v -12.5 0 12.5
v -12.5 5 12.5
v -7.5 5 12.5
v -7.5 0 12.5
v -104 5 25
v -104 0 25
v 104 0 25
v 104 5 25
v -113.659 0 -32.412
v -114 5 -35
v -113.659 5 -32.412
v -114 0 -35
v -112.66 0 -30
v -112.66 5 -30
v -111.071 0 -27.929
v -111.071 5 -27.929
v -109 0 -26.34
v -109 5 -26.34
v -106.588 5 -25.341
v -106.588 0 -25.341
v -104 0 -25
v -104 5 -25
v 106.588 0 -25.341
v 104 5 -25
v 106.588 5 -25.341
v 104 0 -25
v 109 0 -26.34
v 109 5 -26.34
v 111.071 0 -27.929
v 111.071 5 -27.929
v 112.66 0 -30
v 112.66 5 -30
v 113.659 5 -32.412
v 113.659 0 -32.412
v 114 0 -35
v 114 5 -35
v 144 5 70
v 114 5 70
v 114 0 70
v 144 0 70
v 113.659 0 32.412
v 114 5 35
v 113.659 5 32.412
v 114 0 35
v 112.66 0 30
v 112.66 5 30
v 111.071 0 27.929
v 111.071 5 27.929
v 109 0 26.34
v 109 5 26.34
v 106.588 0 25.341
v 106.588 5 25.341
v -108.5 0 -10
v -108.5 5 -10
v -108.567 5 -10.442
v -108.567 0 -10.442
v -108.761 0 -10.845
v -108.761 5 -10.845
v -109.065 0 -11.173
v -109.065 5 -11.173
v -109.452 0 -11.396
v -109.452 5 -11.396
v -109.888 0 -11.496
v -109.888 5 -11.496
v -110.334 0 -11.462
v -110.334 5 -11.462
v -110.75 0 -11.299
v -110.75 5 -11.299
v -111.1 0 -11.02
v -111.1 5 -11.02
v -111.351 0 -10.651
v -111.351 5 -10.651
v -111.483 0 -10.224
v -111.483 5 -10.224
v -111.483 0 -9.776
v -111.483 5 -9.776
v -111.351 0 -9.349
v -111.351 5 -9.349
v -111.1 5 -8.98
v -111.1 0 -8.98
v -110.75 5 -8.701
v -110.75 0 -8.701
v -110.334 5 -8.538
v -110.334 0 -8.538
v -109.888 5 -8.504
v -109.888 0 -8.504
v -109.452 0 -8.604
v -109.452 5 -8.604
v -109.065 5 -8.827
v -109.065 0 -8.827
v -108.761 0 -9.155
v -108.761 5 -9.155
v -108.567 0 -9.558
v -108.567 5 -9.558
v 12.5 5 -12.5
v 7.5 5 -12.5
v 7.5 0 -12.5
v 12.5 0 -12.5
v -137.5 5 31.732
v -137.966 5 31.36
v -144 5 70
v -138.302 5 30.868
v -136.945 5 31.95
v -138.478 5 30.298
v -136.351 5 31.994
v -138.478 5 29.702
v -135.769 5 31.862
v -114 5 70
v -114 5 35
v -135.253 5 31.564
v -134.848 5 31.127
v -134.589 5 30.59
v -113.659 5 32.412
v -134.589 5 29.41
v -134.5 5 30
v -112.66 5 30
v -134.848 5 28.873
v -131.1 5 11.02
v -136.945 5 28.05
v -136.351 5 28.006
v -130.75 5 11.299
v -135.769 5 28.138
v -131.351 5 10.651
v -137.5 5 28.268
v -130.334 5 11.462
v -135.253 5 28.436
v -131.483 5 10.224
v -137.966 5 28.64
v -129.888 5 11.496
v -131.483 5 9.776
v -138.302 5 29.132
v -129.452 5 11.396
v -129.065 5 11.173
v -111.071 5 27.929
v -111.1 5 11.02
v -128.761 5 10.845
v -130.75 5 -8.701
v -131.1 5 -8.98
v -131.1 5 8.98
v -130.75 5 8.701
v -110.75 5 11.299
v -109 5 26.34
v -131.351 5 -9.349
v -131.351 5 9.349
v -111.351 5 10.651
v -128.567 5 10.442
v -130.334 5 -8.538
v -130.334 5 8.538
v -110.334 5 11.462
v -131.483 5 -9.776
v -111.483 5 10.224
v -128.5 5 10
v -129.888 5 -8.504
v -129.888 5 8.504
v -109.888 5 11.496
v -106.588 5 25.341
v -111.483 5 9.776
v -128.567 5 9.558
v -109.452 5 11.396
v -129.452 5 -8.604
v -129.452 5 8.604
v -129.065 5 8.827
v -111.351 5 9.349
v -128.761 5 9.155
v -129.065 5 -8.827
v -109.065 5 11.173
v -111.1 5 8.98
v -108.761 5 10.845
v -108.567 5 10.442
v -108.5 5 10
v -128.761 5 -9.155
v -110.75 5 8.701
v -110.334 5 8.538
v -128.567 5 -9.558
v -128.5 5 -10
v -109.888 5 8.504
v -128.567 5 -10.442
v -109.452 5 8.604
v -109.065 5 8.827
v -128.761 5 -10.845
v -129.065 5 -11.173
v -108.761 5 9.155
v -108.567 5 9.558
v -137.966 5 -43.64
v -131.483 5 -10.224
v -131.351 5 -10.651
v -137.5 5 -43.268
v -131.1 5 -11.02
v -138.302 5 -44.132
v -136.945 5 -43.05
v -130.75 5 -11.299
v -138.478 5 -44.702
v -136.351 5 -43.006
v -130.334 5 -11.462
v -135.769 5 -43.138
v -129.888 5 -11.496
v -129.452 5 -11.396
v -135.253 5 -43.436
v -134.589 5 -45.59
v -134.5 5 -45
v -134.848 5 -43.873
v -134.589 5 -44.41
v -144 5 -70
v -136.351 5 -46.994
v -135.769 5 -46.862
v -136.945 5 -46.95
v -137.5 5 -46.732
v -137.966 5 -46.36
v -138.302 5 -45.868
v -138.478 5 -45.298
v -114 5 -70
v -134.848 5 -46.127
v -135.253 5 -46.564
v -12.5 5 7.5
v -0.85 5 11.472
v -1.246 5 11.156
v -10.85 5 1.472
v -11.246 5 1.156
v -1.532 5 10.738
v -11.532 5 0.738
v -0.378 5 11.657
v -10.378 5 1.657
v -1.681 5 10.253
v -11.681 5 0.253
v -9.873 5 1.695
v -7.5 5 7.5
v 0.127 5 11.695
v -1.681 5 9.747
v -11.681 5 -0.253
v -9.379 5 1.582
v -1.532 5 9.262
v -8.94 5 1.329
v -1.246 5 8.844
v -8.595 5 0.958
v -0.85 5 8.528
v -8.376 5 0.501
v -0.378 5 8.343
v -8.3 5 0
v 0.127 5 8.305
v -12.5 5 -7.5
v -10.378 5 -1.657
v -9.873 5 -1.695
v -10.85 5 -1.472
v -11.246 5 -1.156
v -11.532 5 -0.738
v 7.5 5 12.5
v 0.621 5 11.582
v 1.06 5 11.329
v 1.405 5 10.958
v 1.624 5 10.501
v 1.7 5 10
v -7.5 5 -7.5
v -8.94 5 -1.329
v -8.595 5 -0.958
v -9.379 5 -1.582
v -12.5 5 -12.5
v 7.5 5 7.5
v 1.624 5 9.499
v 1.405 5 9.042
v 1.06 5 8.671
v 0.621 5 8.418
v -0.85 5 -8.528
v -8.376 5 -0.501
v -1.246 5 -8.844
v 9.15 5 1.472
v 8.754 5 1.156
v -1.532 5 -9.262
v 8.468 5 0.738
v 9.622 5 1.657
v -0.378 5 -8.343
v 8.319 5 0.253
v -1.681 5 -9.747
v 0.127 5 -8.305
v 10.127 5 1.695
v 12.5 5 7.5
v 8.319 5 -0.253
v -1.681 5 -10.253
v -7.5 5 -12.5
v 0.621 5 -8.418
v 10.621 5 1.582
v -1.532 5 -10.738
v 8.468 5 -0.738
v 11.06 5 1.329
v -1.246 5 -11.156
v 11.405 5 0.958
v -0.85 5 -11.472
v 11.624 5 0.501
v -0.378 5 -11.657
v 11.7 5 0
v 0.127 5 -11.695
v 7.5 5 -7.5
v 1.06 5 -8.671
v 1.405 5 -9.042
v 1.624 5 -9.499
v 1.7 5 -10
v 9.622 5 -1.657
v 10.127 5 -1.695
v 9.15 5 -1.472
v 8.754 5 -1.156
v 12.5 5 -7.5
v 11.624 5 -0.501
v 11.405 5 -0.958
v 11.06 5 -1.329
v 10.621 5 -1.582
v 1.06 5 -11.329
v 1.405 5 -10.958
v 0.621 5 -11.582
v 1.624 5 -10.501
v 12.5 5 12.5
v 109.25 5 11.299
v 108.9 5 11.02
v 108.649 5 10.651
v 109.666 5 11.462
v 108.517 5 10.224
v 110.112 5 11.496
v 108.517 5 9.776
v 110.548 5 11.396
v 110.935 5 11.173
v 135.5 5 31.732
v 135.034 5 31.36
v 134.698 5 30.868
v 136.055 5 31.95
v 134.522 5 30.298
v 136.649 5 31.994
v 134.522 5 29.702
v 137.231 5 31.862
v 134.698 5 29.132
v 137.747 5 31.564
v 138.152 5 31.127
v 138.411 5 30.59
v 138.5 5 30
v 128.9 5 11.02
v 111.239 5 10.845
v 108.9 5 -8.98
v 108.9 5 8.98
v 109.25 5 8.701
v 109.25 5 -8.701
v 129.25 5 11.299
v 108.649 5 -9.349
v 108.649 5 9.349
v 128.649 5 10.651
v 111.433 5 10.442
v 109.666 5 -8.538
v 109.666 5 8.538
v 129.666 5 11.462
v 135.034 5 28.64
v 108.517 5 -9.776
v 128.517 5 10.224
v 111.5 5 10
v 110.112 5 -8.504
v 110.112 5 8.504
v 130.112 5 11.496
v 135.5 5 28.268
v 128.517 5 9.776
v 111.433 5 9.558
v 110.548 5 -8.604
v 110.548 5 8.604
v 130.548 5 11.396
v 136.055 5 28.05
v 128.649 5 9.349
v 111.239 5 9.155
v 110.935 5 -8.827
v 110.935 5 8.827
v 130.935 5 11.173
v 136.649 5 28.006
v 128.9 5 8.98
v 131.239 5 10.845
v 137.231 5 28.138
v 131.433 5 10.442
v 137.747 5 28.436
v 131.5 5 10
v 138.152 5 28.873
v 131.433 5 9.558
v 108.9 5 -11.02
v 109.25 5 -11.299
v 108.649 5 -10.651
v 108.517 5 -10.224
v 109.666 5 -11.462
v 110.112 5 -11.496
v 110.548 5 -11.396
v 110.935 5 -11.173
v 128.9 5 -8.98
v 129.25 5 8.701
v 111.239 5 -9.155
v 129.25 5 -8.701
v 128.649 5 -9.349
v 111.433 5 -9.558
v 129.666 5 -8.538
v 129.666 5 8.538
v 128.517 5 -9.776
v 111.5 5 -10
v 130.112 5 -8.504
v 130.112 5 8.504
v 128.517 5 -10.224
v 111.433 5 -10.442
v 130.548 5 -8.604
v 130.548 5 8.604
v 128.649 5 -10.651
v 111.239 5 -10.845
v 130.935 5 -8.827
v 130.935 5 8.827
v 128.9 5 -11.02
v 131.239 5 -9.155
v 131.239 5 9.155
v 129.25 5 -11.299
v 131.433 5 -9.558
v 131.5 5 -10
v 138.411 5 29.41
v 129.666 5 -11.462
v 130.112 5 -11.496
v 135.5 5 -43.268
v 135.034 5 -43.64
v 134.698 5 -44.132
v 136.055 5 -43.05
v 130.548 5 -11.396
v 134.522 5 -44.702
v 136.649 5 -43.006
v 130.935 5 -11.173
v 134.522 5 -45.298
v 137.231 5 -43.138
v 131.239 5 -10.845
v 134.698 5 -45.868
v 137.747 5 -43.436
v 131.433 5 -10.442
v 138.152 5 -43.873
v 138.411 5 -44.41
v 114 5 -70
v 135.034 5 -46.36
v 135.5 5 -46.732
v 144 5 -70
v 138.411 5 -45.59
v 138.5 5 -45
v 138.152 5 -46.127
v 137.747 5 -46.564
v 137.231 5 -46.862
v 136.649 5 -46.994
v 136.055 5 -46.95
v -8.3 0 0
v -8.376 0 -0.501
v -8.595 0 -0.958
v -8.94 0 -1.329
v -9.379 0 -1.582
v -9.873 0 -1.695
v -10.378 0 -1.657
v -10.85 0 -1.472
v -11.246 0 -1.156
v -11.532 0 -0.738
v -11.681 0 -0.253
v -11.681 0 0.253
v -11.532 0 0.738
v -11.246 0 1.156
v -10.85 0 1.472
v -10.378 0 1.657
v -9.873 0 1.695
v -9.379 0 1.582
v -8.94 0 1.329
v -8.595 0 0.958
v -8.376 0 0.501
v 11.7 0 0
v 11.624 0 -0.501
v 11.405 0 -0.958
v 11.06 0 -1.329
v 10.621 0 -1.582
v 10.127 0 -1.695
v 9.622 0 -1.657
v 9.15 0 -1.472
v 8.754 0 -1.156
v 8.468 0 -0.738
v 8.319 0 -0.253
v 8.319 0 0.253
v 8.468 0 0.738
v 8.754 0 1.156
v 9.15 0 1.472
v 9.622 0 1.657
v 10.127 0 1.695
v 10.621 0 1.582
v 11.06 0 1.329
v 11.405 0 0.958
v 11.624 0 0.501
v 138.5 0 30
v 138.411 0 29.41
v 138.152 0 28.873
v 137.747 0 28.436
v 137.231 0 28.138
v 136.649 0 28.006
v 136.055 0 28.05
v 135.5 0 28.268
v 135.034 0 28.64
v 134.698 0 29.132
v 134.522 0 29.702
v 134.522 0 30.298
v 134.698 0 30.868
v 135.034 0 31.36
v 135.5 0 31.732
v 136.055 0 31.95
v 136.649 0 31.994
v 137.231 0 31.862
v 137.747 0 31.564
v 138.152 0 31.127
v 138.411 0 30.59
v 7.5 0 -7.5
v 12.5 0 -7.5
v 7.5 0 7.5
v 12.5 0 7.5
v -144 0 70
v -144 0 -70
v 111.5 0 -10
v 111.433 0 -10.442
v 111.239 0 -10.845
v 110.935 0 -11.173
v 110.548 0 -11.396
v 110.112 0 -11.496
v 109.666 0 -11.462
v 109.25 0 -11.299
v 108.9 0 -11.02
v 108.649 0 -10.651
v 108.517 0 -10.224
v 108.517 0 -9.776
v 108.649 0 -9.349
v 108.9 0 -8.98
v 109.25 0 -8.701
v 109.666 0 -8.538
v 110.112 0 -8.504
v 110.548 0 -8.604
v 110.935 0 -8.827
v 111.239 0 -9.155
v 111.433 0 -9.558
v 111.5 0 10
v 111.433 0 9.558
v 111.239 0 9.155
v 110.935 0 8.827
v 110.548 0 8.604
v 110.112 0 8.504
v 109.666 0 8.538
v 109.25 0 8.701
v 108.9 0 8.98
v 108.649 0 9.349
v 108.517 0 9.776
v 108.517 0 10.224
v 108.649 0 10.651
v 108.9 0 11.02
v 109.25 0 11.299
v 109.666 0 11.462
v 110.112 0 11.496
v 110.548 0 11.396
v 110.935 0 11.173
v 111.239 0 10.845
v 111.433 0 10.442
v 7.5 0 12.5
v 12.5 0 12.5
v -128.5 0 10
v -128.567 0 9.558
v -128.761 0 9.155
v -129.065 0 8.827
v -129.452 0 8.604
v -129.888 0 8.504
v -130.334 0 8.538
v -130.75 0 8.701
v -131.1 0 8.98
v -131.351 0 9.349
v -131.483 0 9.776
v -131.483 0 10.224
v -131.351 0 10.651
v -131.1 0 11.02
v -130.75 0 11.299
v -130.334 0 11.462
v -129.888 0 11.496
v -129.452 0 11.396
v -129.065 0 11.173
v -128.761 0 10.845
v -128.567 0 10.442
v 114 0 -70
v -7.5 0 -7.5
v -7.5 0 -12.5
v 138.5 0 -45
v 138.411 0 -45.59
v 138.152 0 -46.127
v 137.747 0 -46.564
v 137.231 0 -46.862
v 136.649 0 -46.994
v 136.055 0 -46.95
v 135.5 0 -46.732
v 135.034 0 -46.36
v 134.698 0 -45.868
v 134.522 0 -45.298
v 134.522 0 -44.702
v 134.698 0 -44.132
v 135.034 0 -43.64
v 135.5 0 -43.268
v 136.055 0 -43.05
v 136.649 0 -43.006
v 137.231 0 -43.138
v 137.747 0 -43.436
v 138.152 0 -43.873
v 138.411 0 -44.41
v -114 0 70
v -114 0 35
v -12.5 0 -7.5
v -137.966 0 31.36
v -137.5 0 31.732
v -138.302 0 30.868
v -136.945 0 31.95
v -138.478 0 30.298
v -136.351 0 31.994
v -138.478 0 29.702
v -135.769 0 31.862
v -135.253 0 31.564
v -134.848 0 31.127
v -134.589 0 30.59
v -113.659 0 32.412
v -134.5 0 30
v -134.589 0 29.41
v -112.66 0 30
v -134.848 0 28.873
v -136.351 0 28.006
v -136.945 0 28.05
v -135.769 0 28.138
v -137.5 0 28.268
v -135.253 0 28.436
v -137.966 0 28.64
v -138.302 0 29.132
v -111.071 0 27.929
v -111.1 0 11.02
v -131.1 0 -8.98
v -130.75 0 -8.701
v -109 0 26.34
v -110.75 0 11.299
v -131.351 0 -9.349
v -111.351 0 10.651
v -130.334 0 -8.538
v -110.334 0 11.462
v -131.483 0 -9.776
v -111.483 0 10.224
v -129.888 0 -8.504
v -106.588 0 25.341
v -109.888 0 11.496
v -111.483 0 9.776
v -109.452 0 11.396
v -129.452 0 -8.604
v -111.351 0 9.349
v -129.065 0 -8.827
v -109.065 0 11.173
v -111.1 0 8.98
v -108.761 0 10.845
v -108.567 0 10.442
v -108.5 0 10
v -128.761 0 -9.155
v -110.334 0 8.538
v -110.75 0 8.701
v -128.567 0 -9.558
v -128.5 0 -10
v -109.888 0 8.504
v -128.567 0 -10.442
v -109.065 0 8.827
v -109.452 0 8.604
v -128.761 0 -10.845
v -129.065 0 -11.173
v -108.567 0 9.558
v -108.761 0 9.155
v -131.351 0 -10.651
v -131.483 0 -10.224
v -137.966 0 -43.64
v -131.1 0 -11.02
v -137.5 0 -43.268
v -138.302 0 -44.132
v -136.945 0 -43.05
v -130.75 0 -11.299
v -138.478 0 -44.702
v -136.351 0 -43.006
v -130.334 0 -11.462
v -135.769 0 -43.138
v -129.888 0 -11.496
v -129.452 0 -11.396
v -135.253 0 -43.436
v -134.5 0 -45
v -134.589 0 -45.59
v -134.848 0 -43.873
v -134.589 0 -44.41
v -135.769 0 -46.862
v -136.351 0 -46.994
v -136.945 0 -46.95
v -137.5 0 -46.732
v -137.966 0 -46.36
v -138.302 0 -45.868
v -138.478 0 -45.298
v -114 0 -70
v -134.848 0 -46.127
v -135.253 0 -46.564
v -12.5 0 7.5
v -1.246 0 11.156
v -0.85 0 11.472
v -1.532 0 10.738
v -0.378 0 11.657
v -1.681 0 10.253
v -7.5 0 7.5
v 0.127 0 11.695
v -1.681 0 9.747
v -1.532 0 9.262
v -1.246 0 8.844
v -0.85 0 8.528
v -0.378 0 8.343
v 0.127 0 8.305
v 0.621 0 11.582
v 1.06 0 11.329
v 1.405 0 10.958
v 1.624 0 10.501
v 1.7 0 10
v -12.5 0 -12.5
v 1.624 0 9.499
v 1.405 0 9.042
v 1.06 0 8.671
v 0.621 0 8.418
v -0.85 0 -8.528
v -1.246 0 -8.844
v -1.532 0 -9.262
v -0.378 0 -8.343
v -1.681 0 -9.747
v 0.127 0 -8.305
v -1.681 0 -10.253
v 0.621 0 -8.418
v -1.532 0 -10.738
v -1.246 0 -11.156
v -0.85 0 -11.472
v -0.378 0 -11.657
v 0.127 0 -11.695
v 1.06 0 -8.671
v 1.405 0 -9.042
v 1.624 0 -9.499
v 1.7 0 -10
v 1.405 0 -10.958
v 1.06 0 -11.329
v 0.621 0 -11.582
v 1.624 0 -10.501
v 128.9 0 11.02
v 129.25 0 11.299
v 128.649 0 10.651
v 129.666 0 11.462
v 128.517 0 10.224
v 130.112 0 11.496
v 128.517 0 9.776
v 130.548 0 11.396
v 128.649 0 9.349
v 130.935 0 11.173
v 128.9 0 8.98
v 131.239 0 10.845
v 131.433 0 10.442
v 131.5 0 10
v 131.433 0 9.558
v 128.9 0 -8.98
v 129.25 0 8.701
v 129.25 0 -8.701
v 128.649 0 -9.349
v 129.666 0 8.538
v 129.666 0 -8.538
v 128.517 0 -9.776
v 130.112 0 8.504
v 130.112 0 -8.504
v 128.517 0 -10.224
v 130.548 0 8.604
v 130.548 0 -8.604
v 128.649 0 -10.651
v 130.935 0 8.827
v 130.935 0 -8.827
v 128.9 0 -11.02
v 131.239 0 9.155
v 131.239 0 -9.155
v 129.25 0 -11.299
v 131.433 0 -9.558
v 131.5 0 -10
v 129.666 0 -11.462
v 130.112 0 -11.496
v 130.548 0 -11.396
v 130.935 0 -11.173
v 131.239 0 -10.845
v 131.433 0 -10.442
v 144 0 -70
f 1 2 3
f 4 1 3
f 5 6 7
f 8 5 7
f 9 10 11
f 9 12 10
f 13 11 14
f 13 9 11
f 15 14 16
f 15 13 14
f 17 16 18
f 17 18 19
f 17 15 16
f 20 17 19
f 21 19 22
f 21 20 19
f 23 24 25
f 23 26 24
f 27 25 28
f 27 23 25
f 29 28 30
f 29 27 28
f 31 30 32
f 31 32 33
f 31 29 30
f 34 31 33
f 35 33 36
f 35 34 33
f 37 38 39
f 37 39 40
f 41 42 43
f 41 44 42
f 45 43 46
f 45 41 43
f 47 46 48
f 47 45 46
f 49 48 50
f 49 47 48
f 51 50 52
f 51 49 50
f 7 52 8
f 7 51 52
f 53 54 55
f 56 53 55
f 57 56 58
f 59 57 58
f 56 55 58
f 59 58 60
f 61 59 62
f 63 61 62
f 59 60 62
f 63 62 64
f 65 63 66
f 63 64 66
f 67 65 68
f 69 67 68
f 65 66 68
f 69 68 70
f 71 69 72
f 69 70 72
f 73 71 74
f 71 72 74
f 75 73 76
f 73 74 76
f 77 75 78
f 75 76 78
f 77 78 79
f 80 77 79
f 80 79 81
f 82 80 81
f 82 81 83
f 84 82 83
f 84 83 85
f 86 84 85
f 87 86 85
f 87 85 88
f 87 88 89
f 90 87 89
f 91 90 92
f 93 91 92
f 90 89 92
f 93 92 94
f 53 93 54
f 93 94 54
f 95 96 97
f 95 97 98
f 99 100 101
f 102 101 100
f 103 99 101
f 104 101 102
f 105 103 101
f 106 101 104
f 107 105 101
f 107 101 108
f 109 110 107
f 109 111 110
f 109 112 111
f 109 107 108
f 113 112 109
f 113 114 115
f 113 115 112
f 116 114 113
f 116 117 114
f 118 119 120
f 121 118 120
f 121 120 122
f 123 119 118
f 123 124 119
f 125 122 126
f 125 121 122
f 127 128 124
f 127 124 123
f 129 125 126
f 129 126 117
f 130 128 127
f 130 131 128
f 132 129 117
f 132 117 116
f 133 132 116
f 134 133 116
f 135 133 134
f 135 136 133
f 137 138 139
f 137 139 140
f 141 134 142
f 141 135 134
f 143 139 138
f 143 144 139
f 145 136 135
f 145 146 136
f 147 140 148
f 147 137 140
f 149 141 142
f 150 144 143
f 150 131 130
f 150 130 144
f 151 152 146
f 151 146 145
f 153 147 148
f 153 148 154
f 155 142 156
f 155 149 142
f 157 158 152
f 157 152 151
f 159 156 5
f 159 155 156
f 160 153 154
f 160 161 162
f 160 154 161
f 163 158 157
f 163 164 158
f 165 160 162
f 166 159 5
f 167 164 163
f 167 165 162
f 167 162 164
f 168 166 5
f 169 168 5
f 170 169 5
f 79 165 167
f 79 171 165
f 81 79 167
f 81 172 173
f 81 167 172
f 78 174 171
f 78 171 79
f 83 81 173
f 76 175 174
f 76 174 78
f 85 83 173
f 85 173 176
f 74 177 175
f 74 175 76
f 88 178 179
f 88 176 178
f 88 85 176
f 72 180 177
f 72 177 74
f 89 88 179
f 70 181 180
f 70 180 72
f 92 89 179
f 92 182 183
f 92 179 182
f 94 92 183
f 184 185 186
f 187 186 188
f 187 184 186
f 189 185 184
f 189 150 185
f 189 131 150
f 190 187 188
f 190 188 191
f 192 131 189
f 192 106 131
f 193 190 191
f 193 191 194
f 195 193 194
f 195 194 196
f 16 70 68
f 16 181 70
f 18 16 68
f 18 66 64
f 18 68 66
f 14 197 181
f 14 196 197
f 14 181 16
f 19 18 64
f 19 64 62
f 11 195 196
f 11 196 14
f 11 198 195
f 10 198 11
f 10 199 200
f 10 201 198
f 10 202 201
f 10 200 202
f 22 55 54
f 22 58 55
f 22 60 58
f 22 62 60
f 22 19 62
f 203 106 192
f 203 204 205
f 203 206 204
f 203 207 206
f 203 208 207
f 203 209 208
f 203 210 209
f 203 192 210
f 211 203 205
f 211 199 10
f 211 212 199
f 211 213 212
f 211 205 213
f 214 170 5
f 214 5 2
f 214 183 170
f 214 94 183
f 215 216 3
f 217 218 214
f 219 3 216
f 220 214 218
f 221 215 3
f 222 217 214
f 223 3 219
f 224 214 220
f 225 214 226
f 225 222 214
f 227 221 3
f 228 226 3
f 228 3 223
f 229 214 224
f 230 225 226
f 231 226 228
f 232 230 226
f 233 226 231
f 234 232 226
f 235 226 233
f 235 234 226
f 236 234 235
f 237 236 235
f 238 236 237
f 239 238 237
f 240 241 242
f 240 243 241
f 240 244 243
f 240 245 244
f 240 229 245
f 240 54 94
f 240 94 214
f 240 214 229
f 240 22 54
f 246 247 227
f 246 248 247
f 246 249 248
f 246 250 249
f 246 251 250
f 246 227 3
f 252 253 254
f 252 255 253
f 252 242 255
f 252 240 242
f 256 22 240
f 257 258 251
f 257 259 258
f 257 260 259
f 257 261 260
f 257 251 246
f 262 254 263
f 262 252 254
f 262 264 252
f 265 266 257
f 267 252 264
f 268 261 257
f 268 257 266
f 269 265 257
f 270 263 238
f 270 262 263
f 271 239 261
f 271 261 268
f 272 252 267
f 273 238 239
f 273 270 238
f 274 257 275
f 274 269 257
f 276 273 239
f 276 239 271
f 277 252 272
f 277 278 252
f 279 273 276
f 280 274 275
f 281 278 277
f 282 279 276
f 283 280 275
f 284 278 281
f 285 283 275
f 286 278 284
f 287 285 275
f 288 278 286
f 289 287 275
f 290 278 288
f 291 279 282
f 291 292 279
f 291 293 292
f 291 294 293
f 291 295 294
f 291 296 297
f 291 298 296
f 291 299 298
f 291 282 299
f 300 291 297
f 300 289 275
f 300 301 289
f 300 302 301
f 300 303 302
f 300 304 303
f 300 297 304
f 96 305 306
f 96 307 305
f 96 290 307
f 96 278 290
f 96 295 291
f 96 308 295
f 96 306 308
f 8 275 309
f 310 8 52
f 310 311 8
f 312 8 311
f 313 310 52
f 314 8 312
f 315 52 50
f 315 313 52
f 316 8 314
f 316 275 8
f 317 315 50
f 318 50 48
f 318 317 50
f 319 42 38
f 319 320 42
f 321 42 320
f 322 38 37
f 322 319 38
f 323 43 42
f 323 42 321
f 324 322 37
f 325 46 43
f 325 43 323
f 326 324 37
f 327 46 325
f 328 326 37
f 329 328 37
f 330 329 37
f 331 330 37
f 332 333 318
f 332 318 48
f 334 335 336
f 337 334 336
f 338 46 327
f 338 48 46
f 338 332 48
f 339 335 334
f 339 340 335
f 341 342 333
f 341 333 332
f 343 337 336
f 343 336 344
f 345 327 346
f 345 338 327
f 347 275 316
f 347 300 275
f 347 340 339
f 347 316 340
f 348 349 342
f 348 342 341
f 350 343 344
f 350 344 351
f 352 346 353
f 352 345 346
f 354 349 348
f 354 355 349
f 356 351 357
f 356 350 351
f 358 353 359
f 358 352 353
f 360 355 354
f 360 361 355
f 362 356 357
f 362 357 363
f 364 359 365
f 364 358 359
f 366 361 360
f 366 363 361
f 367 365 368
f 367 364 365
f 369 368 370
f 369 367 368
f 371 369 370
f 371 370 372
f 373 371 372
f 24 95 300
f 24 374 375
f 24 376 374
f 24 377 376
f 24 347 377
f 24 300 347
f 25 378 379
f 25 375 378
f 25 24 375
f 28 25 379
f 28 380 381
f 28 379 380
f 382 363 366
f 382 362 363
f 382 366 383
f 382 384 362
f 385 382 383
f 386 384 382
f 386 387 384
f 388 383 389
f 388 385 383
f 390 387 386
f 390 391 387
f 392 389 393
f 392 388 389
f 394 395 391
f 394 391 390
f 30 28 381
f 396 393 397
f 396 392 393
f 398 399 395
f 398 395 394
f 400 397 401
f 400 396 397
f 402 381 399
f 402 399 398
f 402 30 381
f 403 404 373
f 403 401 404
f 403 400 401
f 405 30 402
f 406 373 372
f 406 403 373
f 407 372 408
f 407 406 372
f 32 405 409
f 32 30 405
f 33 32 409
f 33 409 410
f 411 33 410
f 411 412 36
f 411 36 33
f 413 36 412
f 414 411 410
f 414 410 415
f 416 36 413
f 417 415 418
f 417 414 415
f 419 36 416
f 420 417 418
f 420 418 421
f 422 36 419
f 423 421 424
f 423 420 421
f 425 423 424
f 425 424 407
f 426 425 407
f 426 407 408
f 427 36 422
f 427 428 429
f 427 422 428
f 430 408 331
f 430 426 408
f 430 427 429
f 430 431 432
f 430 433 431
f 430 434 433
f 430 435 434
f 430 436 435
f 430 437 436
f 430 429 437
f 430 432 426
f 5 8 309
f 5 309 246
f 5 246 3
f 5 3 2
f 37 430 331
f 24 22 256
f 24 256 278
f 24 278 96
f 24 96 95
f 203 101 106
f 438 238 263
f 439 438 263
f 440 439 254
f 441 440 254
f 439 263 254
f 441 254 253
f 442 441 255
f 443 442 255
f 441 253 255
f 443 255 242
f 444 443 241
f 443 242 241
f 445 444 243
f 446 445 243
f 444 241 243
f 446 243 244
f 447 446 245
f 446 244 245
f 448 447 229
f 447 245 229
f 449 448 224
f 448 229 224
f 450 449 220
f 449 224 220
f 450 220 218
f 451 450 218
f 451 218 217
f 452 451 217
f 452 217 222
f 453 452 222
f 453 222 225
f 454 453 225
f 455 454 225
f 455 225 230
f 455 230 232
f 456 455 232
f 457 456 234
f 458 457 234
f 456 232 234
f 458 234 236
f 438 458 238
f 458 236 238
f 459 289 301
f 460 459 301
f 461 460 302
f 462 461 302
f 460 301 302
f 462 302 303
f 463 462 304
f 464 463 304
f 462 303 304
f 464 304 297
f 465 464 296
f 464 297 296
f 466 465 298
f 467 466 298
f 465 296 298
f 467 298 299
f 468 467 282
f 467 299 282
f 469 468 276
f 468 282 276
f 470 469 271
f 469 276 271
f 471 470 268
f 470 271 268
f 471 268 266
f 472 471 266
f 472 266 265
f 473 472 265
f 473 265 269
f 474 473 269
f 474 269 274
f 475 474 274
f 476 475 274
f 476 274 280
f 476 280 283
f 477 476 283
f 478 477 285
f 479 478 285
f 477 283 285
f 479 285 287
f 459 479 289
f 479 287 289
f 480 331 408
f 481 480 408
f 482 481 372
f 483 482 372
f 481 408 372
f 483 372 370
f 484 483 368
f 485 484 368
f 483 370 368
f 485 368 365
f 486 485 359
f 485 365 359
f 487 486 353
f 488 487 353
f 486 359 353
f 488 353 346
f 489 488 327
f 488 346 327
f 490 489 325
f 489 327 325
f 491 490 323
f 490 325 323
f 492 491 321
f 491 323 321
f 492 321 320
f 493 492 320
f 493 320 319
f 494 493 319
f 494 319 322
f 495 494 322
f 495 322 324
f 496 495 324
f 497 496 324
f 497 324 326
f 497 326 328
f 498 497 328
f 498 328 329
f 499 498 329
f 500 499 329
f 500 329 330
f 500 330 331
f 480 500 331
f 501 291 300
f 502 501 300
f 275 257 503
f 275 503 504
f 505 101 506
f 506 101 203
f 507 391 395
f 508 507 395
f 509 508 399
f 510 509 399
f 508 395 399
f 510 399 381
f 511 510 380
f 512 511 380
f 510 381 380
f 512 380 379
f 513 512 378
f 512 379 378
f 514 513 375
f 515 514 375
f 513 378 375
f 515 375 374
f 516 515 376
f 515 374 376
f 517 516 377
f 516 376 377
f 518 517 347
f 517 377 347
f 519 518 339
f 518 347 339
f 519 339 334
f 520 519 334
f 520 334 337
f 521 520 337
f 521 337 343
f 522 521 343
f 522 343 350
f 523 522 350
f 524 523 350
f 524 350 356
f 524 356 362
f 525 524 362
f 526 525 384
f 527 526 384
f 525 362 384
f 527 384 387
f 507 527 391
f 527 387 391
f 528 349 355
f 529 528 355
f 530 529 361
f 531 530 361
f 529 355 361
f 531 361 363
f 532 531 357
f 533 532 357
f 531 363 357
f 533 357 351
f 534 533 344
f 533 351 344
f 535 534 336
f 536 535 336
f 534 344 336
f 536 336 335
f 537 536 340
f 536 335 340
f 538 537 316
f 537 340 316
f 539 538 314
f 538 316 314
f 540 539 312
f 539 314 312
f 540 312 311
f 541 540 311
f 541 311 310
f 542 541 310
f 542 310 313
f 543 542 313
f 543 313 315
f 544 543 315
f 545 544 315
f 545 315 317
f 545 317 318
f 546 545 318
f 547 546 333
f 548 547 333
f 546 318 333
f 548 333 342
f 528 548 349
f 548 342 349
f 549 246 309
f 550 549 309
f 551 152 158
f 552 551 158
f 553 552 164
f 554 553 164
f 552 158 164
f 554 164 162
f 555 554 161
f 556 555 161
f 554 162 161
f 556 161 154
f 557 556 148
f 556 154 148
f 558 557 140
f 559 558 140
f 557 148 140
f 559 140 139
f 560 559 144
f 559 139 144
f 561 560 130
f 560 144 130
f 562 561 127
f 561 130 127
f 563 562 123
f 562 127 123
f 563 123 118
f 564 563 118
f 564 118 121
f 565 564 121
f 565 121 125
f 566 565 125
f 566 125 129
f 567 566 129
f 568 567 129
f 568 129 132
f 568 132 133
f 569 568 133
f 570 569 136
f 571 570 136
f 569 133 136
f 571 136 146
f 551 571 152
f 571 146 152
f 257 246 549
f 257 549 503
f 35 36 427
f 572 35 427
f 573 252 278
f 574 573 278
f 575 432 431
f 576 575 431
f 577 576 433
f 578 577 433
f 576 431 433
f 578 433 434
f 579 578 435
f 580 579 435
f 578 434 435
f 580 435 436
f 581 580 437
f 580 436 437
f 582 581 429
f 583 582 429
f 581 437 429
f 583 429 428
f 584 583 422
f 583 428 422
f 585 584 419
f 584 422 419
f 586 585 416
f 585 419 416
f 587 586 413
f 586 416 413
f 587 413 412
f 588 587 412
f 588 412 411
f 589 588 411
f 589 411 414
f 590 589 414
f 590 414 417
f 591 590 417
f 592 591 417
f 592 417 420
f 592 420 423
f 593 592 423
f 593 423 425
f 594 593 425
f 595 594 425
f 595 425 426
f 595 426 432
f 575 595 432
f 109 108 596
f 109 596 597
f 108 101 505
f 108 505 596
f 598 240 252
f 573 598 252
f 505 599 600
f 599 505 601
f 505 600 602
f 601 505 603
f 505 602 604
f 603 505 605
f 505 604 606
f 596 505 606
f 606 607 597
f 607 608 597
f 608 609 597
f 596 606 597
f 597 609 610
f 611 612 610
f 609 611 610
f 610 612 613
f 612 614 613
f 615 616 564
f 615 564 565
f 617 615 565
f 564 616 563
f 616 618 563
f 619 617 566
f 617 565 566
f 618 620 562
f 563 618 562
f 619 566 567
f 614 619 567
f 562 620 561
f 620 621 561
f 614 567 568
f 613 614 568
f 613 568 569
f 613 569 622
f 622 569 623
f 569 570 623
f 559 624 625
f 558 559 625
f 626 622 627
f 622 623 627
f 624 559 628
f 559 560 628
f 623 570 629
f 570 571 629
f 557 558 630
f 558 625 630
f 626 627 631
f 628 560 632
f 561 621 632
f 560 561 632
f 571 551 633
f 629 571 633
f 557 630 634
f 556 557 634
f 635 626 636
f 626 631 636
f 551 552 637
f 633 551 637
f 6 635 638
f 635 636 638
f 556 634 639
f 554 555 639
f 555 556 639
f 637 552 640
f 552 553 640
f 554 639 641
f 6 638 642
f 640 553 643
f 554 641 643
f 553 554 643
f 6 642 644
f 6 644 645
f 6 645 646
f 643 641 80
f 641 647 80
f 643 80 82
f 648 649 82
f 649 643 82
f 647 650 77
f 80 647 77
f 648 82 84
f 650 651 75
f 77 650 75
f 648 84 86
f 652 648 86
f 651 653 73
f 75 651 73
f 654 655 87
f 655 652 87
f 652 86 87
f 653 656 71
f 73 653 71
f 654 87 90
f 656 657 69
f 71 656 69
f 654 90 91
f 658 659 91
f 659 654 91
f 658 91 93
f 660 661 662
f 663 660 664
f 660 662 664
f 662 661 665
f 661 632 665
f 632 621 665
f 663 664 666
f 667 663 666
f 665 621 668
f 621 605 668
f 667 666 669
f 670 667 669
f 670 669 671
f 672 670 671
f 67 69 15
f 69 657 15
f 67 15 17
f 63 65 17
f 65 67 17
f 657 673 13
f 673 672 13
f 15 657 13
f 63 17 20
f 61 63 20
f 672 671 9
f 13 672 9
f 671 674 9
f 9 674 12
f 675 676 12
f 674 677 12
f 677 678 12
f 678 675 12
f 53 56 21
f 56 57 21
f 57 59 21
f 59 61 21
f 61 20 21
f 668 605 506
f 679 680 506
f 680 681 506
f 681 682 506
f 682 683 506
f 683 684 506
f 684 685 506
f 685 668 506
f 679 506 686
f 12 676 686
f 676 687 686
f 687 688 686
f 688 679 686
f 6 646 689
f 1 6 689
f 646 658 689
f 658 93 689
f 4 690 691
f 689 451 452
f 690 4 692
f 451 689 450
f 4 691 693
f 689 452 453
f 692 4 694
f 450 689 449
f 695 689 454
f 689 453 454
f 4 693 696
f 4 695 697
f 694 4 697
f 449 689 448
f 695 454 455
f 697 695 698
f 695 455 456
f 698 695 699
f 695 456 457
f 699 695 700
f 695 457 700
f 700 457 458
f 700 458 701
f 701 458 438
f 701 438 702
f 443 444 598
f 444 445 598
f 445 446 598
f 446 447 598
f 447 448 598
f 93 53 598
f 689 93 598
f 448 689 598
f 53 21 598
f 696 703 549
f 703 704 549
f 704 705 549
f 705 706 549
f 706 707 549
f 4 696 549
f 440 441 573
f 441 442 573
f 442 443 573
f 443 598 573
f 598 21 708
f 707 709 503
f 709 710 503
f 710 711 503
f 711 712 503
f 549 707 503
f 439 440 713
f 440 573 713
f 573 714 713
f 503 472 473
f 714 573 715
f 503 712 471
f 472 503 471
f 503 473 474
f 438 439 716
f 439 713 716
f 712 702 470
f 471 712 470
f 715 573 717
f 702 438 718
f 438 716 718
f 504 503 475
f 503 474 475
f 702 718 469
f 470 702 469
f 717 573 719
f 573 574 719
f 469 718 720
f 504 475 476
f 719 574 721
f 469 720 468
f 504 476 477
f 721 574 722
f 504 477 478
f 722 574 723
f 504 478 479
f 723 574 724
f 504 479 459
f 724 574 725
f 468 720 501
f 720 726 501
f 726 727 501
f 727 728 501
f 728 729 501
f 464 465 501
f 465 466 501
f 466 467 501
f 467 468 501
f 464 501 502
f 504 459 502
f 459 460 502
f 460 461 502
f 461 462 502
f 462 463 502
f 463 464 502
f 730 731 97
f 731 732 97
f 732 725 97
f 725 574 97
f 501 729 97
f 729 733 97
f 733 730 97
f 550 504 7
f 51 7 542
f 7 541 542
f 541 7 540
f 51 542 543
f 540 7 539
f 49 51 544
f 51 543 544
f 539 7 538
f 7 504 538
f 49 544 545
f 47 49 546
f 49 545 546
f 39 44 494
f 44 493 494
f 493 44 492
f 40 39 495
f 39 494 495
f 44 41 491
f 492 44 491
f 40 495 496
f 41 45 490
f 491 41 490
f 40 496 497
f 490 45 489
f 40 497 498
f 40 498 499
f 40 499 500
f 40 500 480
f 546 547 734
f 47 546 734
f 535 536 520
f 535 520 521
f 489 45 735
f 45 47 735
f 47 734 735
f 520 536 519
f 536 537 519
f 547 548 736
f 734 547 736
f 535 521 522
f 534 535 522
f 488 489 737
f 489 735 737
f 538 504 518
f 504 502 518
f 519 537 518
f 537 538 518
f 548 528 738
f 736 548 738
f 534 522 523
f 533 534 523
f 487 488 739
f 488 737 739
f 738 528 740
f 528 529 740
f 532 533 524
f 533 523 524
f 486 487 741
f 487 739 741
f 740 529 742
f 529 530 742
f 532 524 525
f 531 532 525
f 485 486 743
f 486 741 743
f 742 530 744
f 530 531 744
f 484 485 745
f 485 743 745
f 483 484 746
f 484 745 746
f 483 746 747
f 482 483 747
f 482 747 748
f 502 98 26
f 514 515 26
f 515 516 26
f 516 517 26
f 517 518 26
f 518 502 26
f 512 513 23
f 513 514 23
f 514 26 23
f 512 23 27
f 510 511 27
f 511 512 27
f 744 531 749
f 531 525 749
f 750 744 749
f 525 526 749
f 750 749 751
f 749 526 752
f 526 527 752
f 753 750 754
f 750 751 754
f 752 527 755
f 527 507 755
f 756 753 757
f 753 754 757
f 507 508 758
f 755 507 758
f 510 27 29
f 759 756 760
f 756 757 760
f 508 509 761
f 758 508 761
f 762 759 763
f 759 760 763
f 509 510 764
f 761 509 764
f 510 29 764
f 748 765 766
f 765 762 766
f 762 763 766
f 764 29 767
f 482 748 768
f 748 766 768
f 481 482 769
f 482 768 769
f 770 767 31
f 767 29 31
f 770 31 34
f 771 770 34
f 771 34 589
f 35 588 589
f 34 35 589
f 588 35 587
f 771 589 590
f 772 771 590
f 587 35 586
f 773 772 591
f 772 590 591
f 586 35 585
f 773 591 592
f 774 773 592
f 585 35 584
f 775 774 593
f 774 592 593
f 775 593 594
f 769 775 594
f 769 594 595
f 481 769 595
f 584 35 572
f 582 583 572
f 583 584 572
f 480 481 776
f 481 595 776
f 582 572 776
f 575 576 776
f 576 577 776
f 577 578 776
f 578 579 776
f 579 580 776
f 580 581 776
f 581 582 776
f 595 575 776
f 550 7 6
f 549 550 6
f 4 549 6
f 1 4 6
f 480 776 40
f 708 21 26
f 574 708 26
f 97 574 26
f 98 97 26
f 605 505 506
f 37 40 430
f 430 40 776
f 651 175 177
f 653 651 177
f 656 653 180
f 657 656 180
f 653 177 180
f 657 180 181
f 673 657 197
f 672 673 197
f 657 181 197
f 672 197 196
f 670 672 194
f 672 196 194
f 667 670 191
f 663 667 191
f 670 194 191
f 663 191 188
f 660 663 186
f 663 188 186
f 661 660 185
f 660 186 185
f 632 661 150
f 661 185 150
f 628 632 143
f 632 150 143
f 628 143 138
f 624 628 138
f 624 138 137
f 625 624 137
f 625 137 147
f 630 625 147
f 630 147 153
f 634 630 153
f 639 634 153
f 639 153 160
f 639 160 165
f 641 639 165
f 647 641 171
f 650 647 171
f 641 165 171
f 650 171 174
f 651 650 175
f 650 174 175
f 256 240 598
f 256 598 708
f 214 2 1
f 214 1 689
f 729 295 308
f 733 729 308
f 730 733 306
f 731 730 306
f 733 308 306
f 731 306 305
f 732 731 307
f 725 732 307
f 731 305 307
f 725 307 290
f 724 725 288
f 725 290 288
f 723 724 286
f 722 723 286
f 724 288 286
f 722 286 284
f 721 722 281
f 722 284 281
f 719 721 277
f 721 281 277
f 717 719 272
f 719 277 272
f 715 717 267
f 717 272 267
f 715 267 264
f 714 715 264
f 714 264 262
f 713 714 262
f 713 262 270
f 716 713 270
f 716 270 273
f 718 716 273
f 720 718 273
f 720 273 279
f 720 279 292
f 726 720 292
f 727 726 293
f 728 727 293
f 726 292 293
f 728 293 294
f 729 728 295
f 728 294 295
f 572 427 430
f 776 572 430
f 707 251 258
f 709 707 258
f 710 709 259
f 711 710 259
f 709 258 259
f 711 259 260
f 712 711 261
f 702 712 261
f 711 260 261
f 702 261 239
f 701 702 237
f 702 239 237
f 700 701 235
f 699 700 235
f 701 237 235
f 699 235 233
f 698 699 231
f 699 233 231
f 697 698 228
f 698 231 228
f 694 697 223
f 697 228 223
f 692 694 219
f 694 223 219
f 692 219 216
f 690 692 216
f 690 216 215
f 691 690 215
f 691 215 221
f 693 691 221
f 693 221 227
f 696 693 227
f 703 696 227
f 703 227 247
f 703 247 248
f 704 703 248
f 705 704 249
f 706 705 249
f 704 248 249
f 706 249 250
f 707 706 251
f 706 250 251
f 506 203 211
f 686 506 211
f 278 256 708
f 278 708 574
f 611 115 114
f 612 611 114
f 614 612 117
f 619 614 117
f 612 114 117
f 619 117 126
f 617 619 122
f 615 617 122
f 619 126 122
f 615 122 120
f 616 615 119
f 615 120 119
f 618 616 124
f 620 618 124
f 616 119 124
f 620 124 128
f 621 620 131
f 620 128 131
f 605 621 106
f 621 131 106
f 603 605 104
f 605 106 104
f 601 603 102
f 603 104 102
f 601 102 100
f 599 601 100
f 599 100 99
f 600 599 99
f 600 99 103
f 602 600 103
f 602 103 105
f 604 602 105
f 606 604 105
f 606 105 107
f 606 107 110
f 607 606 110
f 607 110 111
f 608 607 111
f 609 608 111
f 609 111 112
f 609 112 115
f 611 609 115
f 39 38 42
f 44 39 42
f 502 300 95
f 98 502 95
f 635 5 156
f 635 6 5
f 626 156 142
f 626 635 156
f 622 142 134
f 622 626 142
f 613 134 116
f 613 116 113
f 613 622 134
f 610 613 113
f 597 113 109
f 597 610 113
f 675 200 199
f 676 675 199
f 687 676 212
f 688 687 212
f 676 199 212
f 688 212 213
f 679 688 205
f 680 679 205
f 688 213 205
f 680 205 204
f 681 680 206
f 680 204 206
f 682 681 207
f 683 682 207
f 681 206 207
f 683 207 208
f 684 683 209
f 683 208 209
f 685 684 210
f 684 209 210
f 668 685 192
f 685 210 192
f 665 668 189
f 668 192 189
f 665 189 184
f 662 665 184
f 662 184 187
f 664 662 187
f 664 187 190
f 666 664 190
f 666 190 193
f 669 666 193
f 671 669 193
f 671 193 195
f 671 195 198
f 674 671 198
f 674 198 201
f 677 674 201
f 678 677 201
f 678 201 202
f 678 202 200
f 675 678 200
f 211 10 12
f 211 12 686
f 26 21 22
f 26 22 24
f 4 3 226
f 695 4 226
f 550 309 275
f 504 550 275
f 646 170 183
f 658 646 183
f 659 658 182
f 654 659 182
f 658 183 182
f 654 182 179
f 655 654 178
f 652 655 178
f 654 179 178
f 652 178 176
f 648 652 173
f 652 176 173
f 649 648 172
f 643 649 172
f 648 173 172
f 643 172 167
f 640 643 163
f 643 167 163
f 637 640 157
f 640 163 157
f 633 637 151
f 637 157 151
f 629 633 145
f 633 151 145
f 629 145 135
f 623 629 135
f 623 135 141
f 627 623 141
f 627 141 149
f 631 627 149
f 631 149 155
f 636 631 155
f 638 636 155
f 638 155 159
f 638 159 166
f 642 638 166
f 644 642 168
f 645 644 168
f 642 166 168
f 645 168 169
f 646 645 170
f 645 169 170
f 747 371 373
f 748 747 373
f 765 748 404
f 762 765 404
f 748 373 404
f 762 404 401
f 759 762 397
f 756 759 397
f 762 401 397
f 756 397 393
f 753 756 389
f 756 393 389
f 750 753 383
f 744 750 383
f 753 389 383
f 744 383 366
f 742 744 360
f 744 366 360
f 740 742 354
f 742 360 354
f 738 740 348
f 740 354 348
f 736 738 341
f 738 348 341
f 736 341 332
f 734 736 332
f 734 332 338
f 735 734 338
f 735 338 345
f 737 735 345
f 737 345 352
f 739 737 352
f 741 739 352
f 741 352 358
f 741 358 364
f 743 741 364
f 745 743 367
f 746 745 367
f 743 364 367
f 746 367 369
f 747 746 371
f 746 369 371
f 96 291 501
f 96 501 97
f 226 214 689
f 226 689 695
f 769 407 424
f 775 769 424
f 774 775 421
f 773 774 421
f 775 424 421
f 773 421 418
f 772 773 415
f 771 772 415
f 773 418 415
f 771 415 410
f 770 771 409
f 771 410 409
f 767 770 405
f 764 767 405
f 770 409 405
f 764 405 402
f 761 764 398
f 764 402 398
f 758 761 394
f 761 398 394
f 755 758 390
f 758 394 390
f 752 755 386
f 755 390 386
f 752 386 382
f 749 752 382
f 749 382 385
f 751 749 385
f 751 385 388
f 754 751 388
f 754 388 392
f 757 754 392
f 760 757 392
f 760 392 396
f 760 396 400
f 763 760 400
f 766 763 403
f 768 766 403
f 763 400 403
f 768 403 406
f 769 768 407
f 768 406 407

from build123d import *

# Parameters (mm, degrees)
SKETCH1_W           = 288
SKETCH1_H           = 50
BOSS_EXTRUDE1_DEPTH = 5
SKETCH2_R           = 1.5
CUT_EXTRUDE1_DEPTH  = 5
SKETCH3_W           = 30
SKETCH3_H           = 45
BOSS_EXTRUDE2_DEPTH = 5
FILLET1_R           = 10
SKETCH4_W           = 5
SKETCH4_H           = 5
CUT_EXTRUDE2_DEPTH  = 5
SKETCH5_R           = 1.7
CUT_EXTRUDE3_DEPTH  = 5
SKETCH7_R           = 2
CUT_EXTRUDE4_DEPTH  = 10


with BuildPart() as part:
    # Sketch1 → Boss-Extrude1 (new body)
    with BuildSketch(Plane(origin=(0, 0, 0), x_dir=(1, 0, 0), z_dir=(0, 1, 0))):
        Rectangle(SKETCH1_W, SKETCH1_H)
    extrude(amount=BOSS_EXTRUDE1_DEPTH)

    # Sketch2 → Cut-Extrude1 (cut)
    with BuildSketch(Plane(origin=(0, 5, 0), x_dir=(1, 0, 0), z_dir=(0, 1, 0))):
        with Locations((-130, 10)):
            Circle(SKETCH2_R)
        with Locations((-110, 10)):
            Circle(SKETCH2_R)
        with Locations((-110, -10)):
            Circle(SKETCH2_R)
        with Locations((-130, -10)):
            Circle(SKETCH2_R)
        with Locations((130, -10)):
            Circle(SKETCH2_R)
        with Locations((110, -10)):
            Circle(SKETCH2_R)
        with Locations((110, 10)):
            Circle(SKETCH2_R)
        with Locations((130, 10)):
            Circle(SKETCH2_R)
    extrude(amount=-CUT_EXTRUDE1_DEPTH, mode=Mode.SUBTRACT)

    # Sketch3 → Boss-Extrude2 (add)
    with BuildSketch(Plane(origin=(0, 5, 0), x_dir=(1, 0, 0), z_dir=(0, 1, 0))):
        with Locations((-129, 47.5)):
            Rectangle(SKETCH3_W, SKETCH3_H)
        with Locations((-129, -47.5)):
            Rectangle(SKETCH3_W, SKETCH3_H)
        with Locations((129, -47.5)):
            Rectangle(SKETCH3_W, SKETCH3_H)
        with Locations((129, 47.5)):
            Rectangle(SKETCH3_W, SKETCH3_H)
    extrude(amount=-BOSS_EXTRUDE2_DEPTH)

    # Fillet1
    fillet1_edges = [part.edges().sort_by_distance(p)[0] for p in [
        (-114, 2.5, -25),
        (-114, 2.5, 25),
        (114, 2.5, 25),
        (114, 2.5, -25),
    ]]
    fillet(fillet1_edges, radius=FILLET1_R)

    # Sketch4 → Cut-Extrude2 (cut)
    with BuildSketch(Plane(origin=(0, 5, 0), x_dir=(1, 0, 0), z_dir=(0, 1, 0))):
        with Locations((10, 10)):
            Rectangle(SKETCH4_W, SKETCH4_H)
        with Locations((-10, 10)):
            Rectangle(SKETCH4_W, SKETCH4_H)
        with Locations((-10, -10)):
            Rectangle(SKETCH4_W, SKETCH4_H)
        with Locations((10, -10)):
            Rectangle(SKETCH4_W, SKETCH4_H)
    extrude(amount=-CUT_EXTRUDE2_DEPTH, mode=Mode.SUBTRACT)

    # Sketch5 → Cut-Extrude3 (cut)
    with BuildSketch(Plane(origin=(0, 5, 0), x_dir=(1, 0, 0), z_dir=(0, 1, 0))):
        with Locations((0, 10)):
            Circle(SKETCH5_R)
        with Locations((0, -10)):
            Circle(SKETCH5_R)
        with Locations((10, 0)):
            Circle(SKETCH5_R)
        with Locations((-10, 0)):
            Circle(SKETCH5_R)
    extrude(amount=-CUT_EXTRUDE3_DEPTH, mode=Mode.SUBTRACT)

    # Sketch7 → Cut-Extrude4 (cut)
    with BuildSketch(Plane(origin=(0, 5, 0), x_dir=(1, 0, 0), z_dir=(0, 1, 0))):
        with Locations((-136.5, 45)):
            Circle(SKETCH7_R)
        with Locations((-136.5, -30)):
            Circle(SKETCH7_R)
        with Locations((136.5, -30)):
            Circle(SKETCH7_R)
        with Locations((136.5, 45)):
            Circle(SKETCH7_R)
    extrude(amount=-CUT_EXTRUDE4_DEPTH, mode=Mode.SUBTRACT)


solid = part.part
